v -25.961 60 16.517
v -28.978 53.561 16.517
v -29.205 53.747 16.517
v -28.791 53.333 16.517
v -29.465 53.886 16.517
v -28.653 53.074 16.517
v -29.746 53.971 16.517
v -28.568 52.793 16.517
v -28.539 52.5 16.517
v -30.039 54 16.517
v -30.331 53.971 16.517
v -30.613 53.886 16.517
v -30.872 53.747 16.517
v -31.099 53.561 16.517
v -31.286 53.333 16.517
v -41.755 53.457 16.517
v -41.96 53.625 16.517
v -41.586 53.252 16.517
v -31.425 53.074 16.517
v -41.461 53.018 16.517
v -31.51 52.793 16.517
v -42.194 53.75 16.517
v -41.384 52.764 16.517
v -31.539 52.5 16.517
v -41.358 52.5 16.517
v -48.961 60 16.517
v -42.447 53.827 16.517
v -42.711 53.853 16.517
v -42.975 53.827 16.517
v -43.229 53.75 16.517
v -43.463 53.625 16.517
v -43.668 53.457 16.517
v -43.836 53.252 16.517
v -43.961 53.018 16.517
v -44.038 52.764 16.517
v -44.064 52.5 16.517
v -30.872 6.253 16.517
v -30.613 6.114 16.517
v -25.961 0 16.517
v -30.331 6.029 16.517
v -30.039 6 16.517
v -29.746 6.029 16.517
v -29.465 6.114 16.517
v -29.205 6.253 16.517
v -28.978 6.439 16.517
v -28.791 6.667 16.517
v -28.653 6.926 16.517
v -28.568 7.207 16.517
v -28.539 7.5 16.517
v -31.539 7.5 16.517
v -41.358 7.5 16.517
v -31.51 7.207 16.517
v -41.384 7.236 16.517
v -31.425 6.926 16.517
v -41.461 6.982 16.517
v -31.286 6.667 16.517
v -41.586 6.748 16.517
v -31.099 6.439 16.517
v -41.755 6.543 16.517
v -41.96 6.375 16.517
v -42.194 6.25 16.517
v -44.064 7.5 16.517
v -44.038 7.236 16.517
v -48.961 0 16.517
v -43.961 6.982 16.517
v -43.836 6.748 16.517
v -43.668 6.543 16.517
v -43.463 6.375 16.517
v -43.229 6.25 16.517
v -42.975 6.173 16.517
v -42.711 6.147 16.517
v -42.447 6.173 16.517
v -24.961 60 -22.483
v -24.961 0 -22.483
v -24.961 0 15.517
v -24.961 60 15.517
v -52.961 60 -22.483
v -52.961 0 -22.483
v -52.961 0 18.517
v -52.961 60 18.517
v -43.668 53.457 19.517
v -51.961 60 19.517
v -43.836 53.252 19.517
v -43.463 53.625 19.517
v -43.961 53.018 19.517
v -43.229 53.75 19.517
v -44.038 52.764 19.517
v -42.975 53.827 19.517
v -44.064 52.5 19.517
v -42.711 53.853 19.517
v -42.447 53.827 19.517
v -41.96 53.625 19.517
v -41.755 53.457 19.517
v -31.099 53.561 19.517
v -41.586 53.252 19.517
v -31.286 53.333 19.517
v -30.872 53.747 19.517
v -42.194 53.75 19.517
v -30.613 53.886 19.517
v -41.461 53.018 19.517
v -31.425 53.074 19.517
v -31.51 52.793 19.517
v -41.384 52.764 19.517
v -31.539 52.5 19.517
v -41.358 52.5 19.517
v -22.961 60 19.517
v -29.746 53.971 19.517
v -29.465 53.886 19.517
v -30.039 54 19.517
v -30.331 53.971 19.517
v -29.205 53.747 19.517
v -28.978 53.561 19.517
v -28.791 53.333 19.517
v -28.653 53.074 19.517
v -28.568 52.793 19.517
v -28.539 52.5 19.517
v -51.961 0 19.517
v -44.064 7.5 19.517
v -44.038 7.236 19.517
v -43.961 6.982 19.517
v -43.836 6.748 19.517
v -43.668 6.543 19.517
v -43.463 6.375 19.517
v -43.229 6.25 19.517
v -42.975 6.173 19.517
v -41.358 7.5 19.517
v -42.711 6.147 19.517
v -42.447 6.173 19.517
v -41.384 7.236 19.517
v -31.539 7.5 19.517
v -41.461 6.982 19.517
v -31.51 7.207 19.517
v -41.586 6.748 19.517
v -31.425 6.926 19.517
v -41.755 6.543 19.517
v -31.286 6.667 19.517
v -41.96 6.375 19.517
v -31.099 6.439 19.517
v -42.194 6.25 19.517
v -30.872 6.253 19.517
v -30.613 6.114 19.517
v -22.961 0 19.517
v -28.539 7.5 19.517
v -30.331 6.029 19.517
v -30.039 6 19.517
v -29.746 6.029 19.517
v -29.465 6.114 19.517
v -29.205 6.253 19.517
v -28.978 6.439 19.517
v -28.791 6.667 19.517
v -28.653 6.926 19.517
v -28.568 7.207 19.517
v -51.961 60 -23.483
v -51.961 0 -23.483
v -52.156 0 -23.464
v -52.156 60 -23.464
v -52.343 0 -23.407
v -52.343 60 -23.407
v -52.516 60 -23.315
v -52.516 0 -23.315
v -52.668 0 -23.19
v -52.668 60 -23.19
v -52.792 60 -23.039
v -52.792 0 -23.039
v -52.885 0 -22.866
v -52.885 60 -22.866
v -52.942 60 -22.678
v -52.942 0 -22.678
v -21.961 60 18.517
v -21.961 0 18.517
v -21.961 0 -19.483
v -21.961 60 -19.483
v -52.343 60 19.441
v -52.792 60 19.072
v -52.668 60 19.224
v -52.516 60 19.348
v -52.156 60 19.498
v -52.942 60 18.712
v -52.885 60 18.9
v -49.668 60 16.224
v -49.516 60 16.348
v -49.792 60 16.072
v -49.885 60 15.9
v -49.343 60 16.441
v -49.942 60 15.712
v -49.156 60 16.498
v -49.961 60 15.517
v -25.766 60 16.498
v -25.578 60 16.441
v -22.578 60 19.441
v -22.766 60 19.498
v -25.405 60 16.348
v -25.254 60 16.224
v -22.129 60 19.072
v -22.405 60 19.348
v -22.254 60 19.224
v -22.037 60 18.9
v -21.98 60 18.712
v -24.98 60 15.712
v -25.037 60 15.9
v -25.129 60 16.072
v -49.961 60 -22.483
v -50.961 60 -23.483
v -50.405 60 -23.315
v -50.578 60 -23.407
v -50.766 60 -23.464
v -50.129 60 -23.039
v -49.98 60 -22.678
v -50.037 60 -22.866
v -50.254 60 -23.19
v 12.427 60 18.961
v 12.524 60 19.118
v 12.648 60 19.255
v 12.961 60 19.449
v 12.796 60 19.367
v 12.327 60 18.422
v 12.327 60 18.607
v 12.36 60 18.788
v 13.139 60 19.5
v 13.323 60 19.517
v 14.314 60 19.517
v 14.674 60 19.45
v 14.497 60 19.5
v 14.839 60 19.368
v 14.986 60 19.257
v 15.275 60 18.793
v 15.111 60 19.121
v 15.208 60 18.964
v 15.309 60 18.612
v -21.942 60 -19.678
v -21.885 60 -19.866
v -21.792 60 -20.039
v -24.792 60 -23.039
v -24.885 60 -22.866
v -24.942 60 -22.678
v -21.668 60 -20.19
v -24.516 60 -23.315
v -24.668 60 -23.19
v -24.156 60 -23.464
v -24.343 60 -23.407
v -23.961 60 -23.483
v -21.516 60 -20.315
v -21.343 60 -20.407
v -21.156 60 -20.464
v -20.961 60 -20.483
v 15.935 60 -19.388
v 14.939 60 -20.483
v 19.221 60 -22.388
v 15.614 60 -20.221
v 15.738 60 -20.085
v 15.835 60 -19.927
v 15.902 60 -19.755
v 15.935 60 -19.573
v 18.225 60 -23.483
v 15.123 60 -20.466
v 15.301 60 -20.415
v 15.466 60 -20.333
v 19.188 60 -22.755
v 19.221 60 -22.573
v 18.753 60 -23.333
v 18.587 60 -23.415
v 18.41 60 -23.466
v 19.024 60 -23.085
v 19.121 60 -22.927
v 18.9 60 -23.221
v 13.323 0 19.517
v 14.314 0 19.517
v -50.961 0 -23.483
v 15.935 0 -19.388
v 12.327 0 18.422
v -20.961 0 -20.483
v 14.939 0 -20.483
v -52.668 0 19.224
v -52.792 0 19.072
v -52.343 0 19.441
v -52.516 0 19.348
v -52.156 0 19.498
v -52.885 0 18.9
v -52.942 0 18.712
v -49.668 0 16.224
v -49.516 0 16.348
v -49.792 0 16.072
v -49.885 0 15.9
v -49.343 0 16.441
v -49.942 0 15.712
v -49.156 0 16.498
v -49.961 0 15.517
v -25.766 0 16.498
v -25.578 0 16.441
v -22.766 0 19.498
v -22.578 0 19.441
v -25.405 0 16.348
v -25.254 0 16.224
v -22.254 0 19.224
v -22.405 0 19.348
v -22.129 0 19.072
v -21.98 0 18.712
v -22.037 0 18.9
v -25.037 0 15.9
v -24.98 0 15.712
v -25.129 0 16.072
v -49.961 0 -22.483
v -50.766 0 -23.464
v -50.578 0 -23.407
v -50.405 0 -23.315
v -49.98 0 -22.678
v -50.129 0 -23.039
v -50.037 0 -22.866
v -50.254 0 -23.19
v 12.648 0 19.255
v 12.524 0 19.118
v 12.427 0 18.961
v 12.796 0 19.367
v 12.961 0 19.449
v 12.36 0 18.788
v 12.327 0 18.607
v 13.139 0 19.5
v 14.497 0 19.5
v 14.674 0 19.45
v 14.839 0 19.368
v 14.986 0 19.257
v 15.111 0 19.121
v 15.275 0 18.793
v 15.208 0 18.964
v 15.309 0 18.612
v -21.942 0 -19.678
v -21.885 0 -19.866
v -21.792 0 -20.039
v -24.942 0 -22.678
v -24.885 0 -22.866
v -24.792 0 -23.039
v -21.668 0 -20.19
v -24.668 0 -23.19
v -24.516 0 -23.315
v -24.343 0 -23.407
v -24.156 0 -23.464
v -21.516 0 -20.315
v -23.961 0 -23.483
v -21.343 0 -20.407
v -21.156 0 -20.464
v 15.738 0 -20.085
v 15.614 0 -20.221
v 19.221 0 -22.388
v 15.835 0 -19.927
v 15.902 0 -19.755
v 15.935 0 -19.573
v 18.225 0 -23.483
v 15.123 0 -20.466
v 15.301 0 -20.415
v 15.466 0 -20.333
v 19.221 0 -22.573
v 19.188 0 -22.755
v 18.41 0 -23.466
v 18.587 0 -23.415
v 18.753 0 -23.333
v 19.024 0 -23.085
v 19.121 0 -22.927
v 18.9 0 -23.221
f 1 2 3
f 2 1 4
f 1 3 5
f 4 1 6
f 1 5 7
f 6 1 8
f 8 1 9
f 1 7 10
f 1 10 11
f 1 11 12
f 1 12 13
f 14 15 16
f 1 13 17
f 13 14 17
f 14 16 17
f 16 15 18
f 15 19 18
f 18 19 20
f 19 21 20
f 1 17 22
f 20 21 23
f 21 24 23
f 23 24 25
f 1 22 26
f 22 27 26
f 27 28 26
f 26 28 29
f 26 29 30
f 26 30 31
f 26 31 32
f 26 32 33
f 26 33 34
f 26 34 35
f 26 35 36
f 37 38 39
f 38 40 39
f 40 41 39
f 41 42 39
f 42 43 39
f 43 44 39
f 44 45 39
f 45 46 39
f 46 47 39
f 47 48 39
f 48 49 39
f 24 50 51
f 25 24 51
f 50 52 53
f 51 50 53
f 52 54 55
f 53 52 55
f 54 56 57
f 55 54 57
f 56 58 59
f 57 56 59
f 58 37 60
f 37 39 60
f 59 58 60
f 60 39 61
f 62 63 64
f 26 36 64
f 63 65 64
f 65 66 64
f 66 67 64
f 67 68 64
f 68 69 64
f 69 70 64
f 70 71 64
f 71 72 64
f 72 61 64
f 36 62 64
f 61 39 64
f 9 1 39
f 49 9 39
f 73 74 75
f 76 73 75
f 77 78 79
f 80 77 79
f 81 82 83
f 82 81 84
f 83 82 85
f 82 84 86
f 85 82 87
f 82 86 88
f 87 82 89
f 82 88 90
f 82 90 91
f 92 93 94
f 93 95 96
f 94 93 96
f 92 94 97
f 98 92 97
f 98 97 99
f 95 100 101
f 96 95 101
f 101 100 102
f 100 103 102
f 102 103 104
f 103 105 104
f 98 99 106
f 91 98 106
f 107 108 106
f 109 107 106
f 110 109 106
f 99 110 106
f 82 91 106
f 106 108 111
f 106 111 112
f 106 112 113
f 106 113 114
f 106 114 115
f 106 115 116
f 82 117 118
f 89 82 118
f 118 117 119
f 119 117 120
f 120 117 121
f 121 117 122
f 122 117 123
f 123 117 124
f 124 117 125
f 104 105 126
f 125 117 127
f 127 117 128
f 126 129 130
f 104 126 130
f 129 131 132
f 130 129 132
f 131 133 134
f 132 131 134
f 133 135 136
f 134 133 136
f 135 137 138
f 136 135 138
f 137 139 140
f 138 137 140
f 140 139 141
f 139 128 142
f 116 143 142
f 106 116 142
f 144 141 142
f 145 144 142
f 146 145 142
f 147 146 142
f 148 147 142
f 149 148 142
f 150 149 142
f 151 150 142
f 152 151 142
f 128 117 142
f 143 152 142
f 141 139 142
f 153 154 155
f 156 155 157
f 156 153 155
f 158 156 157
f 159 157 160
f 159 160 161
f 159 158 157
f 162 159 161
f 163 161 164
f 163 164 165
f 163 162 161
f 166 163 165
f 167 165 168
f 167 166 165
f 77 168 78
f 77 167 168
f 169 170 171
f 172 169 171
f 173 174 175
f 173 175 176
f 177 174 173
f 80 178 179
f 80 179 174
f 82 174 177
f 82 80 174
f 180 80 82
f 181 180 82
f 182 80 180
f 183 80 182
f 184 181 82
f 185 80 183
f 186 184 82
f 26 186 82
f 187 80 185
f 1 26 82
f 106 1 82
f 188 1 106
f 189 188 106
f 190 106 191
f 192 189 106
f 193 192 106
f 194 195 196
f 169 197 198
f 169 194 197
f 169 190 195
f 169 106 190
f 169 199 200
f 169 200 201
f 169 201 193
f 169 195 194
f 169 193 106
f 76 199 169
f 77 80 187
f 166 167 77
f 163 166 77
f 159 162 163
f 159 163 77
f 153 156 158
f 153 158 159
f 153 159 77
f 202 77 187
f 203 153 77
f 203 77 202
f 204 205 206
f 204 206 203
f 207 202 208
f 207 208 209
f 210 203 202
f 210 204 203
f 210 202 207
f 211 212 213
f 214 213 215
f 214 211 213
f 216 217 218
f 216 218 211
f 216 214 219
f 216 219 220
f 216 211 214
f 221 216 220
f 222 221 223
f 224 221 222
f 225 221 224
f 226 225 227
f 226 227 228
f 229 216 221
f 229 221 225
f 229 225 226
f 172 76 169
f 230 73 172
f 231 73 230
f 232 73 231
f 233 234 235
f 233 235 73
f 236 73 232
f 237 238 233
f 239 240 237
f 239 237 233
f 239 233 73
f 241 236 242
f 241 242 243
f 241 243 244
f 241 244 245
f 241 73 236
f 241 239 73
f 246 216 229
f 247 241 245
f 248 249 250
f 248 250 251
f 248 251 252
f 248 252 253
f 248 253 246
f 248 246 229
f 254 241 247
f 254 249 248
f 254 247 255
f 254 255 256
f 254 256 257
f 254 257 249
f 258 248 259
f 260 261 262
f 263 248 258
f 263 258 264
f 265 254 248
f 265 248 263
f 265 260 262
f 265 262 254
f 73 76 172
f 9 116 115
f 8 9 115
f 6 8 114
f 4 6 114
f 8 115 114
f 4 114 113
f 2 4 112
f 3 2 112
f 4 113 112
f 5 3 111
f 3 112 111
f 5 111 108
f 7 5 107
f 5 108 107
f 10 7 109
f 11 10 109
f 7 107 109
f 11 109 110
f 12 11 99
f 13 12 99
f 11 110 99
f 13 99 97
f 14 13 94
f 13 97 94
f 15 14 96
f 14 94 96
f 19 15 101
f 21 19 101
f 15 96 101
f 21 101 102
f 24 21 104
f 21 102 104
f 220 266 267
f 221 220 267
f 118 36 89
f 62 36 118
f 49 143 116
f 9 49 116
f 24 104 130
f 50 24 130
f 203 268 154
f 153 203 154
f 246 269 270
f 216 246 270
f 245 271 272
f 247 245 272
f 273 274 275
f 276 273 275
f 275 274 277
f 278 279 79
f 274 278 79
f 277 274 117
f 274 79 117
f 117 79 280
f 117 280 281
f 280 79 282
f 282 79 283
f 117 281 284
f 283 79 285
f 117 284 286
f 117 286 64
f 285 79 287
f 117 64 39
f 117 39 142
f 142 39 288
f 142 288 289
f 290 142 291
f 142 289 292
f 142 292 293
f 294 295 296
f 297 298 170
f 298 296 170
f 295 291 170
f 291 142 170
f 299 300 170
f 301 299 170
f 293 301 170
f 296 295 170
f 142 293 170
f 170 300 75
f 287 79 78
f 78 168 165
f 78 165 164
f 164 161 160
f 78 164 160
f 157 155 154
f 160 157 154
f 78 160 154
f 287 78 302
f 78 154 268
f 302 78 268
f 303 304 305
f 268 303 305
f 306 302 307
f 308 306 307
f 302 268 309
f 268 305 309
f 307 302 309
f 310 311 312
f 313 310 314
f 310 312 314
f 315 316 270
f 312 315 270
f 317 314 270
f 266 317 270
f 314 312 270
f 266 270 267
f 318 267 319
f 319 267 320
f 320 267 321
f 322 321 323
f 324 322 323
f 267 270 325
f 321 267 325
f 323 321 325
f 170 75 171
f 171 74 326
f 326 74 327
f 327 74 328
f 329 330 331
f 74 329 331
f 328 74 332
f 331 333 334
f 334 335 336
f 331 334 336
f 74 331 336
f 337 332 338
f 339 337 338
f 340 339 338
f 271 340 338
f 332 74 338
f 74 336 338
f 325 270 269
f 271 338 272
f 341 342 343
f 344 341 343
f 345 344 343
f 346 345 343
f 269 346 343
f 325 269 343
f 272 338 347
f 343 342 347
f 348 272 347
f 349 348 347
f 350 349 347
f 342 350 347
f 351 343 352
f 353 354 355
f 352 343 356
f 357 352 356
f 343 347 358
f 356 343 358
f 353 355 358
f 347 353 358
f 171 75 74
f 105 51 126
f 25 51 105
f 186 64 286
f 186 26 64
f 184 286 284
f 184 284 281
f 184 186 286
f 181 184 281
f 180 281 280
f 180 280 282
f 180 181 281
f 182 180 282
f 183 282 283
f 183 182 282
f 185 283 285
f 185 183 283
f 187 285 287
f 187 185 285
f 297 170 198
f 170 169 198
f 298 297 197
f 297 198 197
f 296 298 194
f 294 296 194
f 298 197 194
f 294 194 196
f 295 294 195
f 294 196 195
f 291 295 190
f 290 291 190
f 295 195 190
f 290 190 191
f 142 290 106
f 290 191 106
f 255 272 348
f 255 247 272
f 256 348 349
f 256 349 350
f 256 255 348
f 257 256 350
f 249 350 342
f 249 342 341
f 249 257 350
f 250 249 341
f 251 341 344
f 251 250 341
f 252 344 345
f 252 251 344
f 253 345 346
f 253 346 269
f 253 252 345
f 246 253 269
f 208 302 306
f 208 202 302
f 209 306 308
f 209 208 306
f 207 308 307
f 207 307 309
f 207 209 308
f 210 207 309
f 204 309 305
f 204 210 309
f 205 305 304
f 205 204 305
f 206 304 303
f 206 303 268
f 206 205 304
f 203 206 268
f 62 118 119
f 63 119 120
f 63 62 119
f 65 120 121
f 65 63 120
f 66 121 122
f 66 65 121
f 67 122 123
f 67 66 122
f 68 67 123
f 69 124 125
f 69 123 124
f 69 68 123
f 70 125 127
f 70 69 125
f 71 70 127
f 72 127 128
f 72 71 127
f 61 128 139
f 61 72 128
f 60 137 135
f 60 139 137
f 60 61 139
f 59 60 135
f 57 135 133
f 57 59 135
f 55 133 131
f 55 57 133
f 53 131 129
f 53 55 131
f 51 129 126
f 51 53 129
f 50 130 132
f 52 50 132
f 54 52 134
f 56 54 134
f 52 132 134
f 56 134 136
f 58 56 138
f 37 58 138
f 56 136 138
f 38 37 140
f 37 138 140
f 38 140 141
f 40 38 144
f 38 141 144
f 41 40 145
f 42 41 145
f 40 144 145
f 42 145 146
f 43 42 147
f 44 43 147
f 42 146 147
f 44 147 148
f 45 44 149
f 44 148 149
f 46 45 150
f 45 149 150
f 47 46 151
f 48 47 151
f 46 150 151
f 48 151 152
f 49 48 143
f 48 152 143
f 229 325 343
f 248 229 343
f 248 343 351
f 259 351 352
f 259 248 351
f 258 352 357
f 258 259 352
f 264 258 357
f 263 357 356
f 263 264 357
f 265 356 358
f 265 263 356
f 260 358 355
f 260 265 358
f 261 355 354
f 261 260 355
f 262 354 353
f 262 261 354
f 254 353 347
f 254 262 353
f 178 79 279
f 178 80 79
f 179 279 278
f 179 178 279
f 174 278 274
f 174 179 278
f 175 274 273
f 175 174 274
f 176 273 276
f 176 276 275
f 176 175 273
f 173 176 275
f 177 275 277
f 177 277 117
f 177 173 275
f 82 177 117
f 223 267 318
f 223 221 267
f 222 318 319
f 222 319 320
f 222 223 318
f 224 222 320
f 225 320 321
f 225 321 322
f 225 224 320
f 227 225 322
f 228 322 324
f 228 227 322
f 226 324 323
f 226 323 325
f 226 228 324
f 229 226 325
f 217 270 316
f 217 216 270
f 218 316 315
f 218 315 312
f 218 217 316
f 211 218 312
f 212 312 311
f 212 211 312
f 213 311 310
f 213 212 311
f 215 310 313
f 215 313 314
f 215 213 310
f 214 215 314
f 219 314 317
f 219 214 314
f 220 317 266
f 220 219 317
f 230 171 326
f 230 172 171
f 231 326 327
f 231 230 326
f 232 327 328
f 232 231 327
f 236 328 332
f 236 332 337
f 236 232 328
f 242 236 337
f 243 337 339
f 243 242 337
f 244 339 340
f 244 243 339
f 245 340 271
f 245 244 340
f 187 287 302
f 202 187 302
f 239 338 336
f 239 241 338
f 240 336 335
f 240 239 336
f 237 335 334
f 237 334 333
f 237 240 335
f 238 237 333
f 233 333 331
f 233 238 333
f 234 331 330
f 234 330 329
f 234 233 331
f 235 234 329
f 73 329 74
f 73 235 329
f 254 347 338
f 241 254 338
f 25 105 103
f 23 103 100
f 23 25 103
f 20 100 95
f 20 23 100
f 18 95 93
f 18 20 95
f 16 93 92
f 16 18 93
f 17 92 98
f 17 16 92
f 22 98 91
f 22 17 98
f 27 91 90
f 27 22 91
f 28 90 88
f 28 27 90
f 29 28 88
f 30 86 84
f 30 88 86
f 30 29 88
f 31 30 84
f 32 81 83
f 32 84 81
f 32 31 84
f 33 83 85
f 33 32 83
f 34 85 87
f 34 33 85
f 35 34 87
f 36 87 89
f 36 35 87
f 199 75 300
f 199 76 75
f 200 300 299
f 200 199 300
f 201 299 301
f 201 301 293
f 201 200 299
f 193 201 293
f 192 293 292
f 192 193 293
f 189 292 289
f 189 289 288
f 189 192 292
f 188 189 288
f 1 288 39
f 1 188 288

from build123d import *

# Parameters (mm, degrees)
BOSS_EXTRU_1_DEPTH           = 60
CONG_3_R                     = 1
ENL_V_MAT_EXTRU_1_DEPTH      = 60
ENL_V_MAT_EXTRU_2_DEPTH      = 90.469797558
ENL_V_MAT_EXTRU_2_DEPTH_BACK = 60


with BuildPart() as part:
    # Esquisse1 → Boss.-Extru.1 (new body)
    with BuildSketch(Plane(origin=(0, 0, 0), x_dir=(1, 0, 0), z_dir=(0, 1, 0))):
        Polygon((-21.960784314, -19.516817925), (-21.960784314, 20.483182075), (16.039215686, 20.483182075), (12.222833137, -19.516817925), (15.222833137, -19.516817925), (19.325444377, 23.483182075), (-24.960784314, 23.483182075), (-24.960784314, -16.516817925), (-49.960784314, -16.516817925), (-49.960784314, 23.483182075), (-52.960784314, 23.483182075), (-52.960784314, -19.516817925), align=None)
    extrude(amount=BOSS_EXTRU_1_DEPTH)

    # Cong_3
    cong_3_edges = [part.edges().sort_by_distance(p)[0] for p in [
        (-52.960784314, 30, 19.516817925),
        (-52.960784314, 30, -23.483182075),
        (-49.960784314, 30, -23.483182075),
        (-49.960784314, 30, 16.516817925),
        (-24.960784314, 30, 16.516817925),
        (-24.960784314, 30, -23.483182075),
        (19.325444377, 30, -23.483182075),
        (15.222833137, 30, 19.516817925),
        (12.222833137, 30, 19.516817925),
        (16.039215686, 30, -20.483182075),
        (-21.960784314, 30, -20.483182075),
        (-21.960784314, 30, 19.516817925),
    ]]
    fillet(cong_3_edges, radius=CONG_3_R)

    # Esquisse2 → Enl_v. mat.-Extru.1 (cut)
    with BuildSketch(Plane(origin=(0, 0, 16.516817925), x_dir=(-1, 0, 0), z_dir=(0, 0, -1))):
        with BuildLine():
            Line((41.358290676, 7.5), (41.358290676, 52.5))
            ThreePointArc((41.358290676, 52.5), (42.711362899, 53.853072223), (44.064435122, 52.5))
            Line((44.064435122, 52.5), (44.064435122, 7.5))
            ThreePointArc((44.064435122, 7.5), (42.711362899, 6.146927777), (41.358290676, 7.5))
        make_face()
    extrude(amount=-ENL_V_MAT_EXTRU_1_DEPTH, mode=Mode.SUBTRACT)

    # Esquisse2_4 → Enl_v. mat.-Extru.2 (cut, two sides: drawn at the far end of the back side and taken through both)
    with BuildSketch(Plane(origin=(0, 0, 16.516817925), x_dir=(-1, 0, 0), z_dir=(0, 0, -1)).offset(-ENL_V_MAT_EXTRU_2_DEPTH_BACK)):
        with BuildLine():
            Line((28.538681886, 7.5), (28.538681886, 52.5))
            ThreePointArc((28.538681886, 52.5), (30.038681886, 54), (31.538681886, 52.5))
            Line((31.538681886, 52.5), (31.538681886, 7.5))
            ThreePointArc((31.538681886, 7.5), (30.038681886, 6), (28.538681886, 7.5))
        make_face()
    extrude(amount=ENL_V_MAT_EXTRU_2_DEPTH + ENL_V_MAT_EXTRU_2_DEPTH_BACK, mode=Mode.SUBTRACT)


solid = part.part
